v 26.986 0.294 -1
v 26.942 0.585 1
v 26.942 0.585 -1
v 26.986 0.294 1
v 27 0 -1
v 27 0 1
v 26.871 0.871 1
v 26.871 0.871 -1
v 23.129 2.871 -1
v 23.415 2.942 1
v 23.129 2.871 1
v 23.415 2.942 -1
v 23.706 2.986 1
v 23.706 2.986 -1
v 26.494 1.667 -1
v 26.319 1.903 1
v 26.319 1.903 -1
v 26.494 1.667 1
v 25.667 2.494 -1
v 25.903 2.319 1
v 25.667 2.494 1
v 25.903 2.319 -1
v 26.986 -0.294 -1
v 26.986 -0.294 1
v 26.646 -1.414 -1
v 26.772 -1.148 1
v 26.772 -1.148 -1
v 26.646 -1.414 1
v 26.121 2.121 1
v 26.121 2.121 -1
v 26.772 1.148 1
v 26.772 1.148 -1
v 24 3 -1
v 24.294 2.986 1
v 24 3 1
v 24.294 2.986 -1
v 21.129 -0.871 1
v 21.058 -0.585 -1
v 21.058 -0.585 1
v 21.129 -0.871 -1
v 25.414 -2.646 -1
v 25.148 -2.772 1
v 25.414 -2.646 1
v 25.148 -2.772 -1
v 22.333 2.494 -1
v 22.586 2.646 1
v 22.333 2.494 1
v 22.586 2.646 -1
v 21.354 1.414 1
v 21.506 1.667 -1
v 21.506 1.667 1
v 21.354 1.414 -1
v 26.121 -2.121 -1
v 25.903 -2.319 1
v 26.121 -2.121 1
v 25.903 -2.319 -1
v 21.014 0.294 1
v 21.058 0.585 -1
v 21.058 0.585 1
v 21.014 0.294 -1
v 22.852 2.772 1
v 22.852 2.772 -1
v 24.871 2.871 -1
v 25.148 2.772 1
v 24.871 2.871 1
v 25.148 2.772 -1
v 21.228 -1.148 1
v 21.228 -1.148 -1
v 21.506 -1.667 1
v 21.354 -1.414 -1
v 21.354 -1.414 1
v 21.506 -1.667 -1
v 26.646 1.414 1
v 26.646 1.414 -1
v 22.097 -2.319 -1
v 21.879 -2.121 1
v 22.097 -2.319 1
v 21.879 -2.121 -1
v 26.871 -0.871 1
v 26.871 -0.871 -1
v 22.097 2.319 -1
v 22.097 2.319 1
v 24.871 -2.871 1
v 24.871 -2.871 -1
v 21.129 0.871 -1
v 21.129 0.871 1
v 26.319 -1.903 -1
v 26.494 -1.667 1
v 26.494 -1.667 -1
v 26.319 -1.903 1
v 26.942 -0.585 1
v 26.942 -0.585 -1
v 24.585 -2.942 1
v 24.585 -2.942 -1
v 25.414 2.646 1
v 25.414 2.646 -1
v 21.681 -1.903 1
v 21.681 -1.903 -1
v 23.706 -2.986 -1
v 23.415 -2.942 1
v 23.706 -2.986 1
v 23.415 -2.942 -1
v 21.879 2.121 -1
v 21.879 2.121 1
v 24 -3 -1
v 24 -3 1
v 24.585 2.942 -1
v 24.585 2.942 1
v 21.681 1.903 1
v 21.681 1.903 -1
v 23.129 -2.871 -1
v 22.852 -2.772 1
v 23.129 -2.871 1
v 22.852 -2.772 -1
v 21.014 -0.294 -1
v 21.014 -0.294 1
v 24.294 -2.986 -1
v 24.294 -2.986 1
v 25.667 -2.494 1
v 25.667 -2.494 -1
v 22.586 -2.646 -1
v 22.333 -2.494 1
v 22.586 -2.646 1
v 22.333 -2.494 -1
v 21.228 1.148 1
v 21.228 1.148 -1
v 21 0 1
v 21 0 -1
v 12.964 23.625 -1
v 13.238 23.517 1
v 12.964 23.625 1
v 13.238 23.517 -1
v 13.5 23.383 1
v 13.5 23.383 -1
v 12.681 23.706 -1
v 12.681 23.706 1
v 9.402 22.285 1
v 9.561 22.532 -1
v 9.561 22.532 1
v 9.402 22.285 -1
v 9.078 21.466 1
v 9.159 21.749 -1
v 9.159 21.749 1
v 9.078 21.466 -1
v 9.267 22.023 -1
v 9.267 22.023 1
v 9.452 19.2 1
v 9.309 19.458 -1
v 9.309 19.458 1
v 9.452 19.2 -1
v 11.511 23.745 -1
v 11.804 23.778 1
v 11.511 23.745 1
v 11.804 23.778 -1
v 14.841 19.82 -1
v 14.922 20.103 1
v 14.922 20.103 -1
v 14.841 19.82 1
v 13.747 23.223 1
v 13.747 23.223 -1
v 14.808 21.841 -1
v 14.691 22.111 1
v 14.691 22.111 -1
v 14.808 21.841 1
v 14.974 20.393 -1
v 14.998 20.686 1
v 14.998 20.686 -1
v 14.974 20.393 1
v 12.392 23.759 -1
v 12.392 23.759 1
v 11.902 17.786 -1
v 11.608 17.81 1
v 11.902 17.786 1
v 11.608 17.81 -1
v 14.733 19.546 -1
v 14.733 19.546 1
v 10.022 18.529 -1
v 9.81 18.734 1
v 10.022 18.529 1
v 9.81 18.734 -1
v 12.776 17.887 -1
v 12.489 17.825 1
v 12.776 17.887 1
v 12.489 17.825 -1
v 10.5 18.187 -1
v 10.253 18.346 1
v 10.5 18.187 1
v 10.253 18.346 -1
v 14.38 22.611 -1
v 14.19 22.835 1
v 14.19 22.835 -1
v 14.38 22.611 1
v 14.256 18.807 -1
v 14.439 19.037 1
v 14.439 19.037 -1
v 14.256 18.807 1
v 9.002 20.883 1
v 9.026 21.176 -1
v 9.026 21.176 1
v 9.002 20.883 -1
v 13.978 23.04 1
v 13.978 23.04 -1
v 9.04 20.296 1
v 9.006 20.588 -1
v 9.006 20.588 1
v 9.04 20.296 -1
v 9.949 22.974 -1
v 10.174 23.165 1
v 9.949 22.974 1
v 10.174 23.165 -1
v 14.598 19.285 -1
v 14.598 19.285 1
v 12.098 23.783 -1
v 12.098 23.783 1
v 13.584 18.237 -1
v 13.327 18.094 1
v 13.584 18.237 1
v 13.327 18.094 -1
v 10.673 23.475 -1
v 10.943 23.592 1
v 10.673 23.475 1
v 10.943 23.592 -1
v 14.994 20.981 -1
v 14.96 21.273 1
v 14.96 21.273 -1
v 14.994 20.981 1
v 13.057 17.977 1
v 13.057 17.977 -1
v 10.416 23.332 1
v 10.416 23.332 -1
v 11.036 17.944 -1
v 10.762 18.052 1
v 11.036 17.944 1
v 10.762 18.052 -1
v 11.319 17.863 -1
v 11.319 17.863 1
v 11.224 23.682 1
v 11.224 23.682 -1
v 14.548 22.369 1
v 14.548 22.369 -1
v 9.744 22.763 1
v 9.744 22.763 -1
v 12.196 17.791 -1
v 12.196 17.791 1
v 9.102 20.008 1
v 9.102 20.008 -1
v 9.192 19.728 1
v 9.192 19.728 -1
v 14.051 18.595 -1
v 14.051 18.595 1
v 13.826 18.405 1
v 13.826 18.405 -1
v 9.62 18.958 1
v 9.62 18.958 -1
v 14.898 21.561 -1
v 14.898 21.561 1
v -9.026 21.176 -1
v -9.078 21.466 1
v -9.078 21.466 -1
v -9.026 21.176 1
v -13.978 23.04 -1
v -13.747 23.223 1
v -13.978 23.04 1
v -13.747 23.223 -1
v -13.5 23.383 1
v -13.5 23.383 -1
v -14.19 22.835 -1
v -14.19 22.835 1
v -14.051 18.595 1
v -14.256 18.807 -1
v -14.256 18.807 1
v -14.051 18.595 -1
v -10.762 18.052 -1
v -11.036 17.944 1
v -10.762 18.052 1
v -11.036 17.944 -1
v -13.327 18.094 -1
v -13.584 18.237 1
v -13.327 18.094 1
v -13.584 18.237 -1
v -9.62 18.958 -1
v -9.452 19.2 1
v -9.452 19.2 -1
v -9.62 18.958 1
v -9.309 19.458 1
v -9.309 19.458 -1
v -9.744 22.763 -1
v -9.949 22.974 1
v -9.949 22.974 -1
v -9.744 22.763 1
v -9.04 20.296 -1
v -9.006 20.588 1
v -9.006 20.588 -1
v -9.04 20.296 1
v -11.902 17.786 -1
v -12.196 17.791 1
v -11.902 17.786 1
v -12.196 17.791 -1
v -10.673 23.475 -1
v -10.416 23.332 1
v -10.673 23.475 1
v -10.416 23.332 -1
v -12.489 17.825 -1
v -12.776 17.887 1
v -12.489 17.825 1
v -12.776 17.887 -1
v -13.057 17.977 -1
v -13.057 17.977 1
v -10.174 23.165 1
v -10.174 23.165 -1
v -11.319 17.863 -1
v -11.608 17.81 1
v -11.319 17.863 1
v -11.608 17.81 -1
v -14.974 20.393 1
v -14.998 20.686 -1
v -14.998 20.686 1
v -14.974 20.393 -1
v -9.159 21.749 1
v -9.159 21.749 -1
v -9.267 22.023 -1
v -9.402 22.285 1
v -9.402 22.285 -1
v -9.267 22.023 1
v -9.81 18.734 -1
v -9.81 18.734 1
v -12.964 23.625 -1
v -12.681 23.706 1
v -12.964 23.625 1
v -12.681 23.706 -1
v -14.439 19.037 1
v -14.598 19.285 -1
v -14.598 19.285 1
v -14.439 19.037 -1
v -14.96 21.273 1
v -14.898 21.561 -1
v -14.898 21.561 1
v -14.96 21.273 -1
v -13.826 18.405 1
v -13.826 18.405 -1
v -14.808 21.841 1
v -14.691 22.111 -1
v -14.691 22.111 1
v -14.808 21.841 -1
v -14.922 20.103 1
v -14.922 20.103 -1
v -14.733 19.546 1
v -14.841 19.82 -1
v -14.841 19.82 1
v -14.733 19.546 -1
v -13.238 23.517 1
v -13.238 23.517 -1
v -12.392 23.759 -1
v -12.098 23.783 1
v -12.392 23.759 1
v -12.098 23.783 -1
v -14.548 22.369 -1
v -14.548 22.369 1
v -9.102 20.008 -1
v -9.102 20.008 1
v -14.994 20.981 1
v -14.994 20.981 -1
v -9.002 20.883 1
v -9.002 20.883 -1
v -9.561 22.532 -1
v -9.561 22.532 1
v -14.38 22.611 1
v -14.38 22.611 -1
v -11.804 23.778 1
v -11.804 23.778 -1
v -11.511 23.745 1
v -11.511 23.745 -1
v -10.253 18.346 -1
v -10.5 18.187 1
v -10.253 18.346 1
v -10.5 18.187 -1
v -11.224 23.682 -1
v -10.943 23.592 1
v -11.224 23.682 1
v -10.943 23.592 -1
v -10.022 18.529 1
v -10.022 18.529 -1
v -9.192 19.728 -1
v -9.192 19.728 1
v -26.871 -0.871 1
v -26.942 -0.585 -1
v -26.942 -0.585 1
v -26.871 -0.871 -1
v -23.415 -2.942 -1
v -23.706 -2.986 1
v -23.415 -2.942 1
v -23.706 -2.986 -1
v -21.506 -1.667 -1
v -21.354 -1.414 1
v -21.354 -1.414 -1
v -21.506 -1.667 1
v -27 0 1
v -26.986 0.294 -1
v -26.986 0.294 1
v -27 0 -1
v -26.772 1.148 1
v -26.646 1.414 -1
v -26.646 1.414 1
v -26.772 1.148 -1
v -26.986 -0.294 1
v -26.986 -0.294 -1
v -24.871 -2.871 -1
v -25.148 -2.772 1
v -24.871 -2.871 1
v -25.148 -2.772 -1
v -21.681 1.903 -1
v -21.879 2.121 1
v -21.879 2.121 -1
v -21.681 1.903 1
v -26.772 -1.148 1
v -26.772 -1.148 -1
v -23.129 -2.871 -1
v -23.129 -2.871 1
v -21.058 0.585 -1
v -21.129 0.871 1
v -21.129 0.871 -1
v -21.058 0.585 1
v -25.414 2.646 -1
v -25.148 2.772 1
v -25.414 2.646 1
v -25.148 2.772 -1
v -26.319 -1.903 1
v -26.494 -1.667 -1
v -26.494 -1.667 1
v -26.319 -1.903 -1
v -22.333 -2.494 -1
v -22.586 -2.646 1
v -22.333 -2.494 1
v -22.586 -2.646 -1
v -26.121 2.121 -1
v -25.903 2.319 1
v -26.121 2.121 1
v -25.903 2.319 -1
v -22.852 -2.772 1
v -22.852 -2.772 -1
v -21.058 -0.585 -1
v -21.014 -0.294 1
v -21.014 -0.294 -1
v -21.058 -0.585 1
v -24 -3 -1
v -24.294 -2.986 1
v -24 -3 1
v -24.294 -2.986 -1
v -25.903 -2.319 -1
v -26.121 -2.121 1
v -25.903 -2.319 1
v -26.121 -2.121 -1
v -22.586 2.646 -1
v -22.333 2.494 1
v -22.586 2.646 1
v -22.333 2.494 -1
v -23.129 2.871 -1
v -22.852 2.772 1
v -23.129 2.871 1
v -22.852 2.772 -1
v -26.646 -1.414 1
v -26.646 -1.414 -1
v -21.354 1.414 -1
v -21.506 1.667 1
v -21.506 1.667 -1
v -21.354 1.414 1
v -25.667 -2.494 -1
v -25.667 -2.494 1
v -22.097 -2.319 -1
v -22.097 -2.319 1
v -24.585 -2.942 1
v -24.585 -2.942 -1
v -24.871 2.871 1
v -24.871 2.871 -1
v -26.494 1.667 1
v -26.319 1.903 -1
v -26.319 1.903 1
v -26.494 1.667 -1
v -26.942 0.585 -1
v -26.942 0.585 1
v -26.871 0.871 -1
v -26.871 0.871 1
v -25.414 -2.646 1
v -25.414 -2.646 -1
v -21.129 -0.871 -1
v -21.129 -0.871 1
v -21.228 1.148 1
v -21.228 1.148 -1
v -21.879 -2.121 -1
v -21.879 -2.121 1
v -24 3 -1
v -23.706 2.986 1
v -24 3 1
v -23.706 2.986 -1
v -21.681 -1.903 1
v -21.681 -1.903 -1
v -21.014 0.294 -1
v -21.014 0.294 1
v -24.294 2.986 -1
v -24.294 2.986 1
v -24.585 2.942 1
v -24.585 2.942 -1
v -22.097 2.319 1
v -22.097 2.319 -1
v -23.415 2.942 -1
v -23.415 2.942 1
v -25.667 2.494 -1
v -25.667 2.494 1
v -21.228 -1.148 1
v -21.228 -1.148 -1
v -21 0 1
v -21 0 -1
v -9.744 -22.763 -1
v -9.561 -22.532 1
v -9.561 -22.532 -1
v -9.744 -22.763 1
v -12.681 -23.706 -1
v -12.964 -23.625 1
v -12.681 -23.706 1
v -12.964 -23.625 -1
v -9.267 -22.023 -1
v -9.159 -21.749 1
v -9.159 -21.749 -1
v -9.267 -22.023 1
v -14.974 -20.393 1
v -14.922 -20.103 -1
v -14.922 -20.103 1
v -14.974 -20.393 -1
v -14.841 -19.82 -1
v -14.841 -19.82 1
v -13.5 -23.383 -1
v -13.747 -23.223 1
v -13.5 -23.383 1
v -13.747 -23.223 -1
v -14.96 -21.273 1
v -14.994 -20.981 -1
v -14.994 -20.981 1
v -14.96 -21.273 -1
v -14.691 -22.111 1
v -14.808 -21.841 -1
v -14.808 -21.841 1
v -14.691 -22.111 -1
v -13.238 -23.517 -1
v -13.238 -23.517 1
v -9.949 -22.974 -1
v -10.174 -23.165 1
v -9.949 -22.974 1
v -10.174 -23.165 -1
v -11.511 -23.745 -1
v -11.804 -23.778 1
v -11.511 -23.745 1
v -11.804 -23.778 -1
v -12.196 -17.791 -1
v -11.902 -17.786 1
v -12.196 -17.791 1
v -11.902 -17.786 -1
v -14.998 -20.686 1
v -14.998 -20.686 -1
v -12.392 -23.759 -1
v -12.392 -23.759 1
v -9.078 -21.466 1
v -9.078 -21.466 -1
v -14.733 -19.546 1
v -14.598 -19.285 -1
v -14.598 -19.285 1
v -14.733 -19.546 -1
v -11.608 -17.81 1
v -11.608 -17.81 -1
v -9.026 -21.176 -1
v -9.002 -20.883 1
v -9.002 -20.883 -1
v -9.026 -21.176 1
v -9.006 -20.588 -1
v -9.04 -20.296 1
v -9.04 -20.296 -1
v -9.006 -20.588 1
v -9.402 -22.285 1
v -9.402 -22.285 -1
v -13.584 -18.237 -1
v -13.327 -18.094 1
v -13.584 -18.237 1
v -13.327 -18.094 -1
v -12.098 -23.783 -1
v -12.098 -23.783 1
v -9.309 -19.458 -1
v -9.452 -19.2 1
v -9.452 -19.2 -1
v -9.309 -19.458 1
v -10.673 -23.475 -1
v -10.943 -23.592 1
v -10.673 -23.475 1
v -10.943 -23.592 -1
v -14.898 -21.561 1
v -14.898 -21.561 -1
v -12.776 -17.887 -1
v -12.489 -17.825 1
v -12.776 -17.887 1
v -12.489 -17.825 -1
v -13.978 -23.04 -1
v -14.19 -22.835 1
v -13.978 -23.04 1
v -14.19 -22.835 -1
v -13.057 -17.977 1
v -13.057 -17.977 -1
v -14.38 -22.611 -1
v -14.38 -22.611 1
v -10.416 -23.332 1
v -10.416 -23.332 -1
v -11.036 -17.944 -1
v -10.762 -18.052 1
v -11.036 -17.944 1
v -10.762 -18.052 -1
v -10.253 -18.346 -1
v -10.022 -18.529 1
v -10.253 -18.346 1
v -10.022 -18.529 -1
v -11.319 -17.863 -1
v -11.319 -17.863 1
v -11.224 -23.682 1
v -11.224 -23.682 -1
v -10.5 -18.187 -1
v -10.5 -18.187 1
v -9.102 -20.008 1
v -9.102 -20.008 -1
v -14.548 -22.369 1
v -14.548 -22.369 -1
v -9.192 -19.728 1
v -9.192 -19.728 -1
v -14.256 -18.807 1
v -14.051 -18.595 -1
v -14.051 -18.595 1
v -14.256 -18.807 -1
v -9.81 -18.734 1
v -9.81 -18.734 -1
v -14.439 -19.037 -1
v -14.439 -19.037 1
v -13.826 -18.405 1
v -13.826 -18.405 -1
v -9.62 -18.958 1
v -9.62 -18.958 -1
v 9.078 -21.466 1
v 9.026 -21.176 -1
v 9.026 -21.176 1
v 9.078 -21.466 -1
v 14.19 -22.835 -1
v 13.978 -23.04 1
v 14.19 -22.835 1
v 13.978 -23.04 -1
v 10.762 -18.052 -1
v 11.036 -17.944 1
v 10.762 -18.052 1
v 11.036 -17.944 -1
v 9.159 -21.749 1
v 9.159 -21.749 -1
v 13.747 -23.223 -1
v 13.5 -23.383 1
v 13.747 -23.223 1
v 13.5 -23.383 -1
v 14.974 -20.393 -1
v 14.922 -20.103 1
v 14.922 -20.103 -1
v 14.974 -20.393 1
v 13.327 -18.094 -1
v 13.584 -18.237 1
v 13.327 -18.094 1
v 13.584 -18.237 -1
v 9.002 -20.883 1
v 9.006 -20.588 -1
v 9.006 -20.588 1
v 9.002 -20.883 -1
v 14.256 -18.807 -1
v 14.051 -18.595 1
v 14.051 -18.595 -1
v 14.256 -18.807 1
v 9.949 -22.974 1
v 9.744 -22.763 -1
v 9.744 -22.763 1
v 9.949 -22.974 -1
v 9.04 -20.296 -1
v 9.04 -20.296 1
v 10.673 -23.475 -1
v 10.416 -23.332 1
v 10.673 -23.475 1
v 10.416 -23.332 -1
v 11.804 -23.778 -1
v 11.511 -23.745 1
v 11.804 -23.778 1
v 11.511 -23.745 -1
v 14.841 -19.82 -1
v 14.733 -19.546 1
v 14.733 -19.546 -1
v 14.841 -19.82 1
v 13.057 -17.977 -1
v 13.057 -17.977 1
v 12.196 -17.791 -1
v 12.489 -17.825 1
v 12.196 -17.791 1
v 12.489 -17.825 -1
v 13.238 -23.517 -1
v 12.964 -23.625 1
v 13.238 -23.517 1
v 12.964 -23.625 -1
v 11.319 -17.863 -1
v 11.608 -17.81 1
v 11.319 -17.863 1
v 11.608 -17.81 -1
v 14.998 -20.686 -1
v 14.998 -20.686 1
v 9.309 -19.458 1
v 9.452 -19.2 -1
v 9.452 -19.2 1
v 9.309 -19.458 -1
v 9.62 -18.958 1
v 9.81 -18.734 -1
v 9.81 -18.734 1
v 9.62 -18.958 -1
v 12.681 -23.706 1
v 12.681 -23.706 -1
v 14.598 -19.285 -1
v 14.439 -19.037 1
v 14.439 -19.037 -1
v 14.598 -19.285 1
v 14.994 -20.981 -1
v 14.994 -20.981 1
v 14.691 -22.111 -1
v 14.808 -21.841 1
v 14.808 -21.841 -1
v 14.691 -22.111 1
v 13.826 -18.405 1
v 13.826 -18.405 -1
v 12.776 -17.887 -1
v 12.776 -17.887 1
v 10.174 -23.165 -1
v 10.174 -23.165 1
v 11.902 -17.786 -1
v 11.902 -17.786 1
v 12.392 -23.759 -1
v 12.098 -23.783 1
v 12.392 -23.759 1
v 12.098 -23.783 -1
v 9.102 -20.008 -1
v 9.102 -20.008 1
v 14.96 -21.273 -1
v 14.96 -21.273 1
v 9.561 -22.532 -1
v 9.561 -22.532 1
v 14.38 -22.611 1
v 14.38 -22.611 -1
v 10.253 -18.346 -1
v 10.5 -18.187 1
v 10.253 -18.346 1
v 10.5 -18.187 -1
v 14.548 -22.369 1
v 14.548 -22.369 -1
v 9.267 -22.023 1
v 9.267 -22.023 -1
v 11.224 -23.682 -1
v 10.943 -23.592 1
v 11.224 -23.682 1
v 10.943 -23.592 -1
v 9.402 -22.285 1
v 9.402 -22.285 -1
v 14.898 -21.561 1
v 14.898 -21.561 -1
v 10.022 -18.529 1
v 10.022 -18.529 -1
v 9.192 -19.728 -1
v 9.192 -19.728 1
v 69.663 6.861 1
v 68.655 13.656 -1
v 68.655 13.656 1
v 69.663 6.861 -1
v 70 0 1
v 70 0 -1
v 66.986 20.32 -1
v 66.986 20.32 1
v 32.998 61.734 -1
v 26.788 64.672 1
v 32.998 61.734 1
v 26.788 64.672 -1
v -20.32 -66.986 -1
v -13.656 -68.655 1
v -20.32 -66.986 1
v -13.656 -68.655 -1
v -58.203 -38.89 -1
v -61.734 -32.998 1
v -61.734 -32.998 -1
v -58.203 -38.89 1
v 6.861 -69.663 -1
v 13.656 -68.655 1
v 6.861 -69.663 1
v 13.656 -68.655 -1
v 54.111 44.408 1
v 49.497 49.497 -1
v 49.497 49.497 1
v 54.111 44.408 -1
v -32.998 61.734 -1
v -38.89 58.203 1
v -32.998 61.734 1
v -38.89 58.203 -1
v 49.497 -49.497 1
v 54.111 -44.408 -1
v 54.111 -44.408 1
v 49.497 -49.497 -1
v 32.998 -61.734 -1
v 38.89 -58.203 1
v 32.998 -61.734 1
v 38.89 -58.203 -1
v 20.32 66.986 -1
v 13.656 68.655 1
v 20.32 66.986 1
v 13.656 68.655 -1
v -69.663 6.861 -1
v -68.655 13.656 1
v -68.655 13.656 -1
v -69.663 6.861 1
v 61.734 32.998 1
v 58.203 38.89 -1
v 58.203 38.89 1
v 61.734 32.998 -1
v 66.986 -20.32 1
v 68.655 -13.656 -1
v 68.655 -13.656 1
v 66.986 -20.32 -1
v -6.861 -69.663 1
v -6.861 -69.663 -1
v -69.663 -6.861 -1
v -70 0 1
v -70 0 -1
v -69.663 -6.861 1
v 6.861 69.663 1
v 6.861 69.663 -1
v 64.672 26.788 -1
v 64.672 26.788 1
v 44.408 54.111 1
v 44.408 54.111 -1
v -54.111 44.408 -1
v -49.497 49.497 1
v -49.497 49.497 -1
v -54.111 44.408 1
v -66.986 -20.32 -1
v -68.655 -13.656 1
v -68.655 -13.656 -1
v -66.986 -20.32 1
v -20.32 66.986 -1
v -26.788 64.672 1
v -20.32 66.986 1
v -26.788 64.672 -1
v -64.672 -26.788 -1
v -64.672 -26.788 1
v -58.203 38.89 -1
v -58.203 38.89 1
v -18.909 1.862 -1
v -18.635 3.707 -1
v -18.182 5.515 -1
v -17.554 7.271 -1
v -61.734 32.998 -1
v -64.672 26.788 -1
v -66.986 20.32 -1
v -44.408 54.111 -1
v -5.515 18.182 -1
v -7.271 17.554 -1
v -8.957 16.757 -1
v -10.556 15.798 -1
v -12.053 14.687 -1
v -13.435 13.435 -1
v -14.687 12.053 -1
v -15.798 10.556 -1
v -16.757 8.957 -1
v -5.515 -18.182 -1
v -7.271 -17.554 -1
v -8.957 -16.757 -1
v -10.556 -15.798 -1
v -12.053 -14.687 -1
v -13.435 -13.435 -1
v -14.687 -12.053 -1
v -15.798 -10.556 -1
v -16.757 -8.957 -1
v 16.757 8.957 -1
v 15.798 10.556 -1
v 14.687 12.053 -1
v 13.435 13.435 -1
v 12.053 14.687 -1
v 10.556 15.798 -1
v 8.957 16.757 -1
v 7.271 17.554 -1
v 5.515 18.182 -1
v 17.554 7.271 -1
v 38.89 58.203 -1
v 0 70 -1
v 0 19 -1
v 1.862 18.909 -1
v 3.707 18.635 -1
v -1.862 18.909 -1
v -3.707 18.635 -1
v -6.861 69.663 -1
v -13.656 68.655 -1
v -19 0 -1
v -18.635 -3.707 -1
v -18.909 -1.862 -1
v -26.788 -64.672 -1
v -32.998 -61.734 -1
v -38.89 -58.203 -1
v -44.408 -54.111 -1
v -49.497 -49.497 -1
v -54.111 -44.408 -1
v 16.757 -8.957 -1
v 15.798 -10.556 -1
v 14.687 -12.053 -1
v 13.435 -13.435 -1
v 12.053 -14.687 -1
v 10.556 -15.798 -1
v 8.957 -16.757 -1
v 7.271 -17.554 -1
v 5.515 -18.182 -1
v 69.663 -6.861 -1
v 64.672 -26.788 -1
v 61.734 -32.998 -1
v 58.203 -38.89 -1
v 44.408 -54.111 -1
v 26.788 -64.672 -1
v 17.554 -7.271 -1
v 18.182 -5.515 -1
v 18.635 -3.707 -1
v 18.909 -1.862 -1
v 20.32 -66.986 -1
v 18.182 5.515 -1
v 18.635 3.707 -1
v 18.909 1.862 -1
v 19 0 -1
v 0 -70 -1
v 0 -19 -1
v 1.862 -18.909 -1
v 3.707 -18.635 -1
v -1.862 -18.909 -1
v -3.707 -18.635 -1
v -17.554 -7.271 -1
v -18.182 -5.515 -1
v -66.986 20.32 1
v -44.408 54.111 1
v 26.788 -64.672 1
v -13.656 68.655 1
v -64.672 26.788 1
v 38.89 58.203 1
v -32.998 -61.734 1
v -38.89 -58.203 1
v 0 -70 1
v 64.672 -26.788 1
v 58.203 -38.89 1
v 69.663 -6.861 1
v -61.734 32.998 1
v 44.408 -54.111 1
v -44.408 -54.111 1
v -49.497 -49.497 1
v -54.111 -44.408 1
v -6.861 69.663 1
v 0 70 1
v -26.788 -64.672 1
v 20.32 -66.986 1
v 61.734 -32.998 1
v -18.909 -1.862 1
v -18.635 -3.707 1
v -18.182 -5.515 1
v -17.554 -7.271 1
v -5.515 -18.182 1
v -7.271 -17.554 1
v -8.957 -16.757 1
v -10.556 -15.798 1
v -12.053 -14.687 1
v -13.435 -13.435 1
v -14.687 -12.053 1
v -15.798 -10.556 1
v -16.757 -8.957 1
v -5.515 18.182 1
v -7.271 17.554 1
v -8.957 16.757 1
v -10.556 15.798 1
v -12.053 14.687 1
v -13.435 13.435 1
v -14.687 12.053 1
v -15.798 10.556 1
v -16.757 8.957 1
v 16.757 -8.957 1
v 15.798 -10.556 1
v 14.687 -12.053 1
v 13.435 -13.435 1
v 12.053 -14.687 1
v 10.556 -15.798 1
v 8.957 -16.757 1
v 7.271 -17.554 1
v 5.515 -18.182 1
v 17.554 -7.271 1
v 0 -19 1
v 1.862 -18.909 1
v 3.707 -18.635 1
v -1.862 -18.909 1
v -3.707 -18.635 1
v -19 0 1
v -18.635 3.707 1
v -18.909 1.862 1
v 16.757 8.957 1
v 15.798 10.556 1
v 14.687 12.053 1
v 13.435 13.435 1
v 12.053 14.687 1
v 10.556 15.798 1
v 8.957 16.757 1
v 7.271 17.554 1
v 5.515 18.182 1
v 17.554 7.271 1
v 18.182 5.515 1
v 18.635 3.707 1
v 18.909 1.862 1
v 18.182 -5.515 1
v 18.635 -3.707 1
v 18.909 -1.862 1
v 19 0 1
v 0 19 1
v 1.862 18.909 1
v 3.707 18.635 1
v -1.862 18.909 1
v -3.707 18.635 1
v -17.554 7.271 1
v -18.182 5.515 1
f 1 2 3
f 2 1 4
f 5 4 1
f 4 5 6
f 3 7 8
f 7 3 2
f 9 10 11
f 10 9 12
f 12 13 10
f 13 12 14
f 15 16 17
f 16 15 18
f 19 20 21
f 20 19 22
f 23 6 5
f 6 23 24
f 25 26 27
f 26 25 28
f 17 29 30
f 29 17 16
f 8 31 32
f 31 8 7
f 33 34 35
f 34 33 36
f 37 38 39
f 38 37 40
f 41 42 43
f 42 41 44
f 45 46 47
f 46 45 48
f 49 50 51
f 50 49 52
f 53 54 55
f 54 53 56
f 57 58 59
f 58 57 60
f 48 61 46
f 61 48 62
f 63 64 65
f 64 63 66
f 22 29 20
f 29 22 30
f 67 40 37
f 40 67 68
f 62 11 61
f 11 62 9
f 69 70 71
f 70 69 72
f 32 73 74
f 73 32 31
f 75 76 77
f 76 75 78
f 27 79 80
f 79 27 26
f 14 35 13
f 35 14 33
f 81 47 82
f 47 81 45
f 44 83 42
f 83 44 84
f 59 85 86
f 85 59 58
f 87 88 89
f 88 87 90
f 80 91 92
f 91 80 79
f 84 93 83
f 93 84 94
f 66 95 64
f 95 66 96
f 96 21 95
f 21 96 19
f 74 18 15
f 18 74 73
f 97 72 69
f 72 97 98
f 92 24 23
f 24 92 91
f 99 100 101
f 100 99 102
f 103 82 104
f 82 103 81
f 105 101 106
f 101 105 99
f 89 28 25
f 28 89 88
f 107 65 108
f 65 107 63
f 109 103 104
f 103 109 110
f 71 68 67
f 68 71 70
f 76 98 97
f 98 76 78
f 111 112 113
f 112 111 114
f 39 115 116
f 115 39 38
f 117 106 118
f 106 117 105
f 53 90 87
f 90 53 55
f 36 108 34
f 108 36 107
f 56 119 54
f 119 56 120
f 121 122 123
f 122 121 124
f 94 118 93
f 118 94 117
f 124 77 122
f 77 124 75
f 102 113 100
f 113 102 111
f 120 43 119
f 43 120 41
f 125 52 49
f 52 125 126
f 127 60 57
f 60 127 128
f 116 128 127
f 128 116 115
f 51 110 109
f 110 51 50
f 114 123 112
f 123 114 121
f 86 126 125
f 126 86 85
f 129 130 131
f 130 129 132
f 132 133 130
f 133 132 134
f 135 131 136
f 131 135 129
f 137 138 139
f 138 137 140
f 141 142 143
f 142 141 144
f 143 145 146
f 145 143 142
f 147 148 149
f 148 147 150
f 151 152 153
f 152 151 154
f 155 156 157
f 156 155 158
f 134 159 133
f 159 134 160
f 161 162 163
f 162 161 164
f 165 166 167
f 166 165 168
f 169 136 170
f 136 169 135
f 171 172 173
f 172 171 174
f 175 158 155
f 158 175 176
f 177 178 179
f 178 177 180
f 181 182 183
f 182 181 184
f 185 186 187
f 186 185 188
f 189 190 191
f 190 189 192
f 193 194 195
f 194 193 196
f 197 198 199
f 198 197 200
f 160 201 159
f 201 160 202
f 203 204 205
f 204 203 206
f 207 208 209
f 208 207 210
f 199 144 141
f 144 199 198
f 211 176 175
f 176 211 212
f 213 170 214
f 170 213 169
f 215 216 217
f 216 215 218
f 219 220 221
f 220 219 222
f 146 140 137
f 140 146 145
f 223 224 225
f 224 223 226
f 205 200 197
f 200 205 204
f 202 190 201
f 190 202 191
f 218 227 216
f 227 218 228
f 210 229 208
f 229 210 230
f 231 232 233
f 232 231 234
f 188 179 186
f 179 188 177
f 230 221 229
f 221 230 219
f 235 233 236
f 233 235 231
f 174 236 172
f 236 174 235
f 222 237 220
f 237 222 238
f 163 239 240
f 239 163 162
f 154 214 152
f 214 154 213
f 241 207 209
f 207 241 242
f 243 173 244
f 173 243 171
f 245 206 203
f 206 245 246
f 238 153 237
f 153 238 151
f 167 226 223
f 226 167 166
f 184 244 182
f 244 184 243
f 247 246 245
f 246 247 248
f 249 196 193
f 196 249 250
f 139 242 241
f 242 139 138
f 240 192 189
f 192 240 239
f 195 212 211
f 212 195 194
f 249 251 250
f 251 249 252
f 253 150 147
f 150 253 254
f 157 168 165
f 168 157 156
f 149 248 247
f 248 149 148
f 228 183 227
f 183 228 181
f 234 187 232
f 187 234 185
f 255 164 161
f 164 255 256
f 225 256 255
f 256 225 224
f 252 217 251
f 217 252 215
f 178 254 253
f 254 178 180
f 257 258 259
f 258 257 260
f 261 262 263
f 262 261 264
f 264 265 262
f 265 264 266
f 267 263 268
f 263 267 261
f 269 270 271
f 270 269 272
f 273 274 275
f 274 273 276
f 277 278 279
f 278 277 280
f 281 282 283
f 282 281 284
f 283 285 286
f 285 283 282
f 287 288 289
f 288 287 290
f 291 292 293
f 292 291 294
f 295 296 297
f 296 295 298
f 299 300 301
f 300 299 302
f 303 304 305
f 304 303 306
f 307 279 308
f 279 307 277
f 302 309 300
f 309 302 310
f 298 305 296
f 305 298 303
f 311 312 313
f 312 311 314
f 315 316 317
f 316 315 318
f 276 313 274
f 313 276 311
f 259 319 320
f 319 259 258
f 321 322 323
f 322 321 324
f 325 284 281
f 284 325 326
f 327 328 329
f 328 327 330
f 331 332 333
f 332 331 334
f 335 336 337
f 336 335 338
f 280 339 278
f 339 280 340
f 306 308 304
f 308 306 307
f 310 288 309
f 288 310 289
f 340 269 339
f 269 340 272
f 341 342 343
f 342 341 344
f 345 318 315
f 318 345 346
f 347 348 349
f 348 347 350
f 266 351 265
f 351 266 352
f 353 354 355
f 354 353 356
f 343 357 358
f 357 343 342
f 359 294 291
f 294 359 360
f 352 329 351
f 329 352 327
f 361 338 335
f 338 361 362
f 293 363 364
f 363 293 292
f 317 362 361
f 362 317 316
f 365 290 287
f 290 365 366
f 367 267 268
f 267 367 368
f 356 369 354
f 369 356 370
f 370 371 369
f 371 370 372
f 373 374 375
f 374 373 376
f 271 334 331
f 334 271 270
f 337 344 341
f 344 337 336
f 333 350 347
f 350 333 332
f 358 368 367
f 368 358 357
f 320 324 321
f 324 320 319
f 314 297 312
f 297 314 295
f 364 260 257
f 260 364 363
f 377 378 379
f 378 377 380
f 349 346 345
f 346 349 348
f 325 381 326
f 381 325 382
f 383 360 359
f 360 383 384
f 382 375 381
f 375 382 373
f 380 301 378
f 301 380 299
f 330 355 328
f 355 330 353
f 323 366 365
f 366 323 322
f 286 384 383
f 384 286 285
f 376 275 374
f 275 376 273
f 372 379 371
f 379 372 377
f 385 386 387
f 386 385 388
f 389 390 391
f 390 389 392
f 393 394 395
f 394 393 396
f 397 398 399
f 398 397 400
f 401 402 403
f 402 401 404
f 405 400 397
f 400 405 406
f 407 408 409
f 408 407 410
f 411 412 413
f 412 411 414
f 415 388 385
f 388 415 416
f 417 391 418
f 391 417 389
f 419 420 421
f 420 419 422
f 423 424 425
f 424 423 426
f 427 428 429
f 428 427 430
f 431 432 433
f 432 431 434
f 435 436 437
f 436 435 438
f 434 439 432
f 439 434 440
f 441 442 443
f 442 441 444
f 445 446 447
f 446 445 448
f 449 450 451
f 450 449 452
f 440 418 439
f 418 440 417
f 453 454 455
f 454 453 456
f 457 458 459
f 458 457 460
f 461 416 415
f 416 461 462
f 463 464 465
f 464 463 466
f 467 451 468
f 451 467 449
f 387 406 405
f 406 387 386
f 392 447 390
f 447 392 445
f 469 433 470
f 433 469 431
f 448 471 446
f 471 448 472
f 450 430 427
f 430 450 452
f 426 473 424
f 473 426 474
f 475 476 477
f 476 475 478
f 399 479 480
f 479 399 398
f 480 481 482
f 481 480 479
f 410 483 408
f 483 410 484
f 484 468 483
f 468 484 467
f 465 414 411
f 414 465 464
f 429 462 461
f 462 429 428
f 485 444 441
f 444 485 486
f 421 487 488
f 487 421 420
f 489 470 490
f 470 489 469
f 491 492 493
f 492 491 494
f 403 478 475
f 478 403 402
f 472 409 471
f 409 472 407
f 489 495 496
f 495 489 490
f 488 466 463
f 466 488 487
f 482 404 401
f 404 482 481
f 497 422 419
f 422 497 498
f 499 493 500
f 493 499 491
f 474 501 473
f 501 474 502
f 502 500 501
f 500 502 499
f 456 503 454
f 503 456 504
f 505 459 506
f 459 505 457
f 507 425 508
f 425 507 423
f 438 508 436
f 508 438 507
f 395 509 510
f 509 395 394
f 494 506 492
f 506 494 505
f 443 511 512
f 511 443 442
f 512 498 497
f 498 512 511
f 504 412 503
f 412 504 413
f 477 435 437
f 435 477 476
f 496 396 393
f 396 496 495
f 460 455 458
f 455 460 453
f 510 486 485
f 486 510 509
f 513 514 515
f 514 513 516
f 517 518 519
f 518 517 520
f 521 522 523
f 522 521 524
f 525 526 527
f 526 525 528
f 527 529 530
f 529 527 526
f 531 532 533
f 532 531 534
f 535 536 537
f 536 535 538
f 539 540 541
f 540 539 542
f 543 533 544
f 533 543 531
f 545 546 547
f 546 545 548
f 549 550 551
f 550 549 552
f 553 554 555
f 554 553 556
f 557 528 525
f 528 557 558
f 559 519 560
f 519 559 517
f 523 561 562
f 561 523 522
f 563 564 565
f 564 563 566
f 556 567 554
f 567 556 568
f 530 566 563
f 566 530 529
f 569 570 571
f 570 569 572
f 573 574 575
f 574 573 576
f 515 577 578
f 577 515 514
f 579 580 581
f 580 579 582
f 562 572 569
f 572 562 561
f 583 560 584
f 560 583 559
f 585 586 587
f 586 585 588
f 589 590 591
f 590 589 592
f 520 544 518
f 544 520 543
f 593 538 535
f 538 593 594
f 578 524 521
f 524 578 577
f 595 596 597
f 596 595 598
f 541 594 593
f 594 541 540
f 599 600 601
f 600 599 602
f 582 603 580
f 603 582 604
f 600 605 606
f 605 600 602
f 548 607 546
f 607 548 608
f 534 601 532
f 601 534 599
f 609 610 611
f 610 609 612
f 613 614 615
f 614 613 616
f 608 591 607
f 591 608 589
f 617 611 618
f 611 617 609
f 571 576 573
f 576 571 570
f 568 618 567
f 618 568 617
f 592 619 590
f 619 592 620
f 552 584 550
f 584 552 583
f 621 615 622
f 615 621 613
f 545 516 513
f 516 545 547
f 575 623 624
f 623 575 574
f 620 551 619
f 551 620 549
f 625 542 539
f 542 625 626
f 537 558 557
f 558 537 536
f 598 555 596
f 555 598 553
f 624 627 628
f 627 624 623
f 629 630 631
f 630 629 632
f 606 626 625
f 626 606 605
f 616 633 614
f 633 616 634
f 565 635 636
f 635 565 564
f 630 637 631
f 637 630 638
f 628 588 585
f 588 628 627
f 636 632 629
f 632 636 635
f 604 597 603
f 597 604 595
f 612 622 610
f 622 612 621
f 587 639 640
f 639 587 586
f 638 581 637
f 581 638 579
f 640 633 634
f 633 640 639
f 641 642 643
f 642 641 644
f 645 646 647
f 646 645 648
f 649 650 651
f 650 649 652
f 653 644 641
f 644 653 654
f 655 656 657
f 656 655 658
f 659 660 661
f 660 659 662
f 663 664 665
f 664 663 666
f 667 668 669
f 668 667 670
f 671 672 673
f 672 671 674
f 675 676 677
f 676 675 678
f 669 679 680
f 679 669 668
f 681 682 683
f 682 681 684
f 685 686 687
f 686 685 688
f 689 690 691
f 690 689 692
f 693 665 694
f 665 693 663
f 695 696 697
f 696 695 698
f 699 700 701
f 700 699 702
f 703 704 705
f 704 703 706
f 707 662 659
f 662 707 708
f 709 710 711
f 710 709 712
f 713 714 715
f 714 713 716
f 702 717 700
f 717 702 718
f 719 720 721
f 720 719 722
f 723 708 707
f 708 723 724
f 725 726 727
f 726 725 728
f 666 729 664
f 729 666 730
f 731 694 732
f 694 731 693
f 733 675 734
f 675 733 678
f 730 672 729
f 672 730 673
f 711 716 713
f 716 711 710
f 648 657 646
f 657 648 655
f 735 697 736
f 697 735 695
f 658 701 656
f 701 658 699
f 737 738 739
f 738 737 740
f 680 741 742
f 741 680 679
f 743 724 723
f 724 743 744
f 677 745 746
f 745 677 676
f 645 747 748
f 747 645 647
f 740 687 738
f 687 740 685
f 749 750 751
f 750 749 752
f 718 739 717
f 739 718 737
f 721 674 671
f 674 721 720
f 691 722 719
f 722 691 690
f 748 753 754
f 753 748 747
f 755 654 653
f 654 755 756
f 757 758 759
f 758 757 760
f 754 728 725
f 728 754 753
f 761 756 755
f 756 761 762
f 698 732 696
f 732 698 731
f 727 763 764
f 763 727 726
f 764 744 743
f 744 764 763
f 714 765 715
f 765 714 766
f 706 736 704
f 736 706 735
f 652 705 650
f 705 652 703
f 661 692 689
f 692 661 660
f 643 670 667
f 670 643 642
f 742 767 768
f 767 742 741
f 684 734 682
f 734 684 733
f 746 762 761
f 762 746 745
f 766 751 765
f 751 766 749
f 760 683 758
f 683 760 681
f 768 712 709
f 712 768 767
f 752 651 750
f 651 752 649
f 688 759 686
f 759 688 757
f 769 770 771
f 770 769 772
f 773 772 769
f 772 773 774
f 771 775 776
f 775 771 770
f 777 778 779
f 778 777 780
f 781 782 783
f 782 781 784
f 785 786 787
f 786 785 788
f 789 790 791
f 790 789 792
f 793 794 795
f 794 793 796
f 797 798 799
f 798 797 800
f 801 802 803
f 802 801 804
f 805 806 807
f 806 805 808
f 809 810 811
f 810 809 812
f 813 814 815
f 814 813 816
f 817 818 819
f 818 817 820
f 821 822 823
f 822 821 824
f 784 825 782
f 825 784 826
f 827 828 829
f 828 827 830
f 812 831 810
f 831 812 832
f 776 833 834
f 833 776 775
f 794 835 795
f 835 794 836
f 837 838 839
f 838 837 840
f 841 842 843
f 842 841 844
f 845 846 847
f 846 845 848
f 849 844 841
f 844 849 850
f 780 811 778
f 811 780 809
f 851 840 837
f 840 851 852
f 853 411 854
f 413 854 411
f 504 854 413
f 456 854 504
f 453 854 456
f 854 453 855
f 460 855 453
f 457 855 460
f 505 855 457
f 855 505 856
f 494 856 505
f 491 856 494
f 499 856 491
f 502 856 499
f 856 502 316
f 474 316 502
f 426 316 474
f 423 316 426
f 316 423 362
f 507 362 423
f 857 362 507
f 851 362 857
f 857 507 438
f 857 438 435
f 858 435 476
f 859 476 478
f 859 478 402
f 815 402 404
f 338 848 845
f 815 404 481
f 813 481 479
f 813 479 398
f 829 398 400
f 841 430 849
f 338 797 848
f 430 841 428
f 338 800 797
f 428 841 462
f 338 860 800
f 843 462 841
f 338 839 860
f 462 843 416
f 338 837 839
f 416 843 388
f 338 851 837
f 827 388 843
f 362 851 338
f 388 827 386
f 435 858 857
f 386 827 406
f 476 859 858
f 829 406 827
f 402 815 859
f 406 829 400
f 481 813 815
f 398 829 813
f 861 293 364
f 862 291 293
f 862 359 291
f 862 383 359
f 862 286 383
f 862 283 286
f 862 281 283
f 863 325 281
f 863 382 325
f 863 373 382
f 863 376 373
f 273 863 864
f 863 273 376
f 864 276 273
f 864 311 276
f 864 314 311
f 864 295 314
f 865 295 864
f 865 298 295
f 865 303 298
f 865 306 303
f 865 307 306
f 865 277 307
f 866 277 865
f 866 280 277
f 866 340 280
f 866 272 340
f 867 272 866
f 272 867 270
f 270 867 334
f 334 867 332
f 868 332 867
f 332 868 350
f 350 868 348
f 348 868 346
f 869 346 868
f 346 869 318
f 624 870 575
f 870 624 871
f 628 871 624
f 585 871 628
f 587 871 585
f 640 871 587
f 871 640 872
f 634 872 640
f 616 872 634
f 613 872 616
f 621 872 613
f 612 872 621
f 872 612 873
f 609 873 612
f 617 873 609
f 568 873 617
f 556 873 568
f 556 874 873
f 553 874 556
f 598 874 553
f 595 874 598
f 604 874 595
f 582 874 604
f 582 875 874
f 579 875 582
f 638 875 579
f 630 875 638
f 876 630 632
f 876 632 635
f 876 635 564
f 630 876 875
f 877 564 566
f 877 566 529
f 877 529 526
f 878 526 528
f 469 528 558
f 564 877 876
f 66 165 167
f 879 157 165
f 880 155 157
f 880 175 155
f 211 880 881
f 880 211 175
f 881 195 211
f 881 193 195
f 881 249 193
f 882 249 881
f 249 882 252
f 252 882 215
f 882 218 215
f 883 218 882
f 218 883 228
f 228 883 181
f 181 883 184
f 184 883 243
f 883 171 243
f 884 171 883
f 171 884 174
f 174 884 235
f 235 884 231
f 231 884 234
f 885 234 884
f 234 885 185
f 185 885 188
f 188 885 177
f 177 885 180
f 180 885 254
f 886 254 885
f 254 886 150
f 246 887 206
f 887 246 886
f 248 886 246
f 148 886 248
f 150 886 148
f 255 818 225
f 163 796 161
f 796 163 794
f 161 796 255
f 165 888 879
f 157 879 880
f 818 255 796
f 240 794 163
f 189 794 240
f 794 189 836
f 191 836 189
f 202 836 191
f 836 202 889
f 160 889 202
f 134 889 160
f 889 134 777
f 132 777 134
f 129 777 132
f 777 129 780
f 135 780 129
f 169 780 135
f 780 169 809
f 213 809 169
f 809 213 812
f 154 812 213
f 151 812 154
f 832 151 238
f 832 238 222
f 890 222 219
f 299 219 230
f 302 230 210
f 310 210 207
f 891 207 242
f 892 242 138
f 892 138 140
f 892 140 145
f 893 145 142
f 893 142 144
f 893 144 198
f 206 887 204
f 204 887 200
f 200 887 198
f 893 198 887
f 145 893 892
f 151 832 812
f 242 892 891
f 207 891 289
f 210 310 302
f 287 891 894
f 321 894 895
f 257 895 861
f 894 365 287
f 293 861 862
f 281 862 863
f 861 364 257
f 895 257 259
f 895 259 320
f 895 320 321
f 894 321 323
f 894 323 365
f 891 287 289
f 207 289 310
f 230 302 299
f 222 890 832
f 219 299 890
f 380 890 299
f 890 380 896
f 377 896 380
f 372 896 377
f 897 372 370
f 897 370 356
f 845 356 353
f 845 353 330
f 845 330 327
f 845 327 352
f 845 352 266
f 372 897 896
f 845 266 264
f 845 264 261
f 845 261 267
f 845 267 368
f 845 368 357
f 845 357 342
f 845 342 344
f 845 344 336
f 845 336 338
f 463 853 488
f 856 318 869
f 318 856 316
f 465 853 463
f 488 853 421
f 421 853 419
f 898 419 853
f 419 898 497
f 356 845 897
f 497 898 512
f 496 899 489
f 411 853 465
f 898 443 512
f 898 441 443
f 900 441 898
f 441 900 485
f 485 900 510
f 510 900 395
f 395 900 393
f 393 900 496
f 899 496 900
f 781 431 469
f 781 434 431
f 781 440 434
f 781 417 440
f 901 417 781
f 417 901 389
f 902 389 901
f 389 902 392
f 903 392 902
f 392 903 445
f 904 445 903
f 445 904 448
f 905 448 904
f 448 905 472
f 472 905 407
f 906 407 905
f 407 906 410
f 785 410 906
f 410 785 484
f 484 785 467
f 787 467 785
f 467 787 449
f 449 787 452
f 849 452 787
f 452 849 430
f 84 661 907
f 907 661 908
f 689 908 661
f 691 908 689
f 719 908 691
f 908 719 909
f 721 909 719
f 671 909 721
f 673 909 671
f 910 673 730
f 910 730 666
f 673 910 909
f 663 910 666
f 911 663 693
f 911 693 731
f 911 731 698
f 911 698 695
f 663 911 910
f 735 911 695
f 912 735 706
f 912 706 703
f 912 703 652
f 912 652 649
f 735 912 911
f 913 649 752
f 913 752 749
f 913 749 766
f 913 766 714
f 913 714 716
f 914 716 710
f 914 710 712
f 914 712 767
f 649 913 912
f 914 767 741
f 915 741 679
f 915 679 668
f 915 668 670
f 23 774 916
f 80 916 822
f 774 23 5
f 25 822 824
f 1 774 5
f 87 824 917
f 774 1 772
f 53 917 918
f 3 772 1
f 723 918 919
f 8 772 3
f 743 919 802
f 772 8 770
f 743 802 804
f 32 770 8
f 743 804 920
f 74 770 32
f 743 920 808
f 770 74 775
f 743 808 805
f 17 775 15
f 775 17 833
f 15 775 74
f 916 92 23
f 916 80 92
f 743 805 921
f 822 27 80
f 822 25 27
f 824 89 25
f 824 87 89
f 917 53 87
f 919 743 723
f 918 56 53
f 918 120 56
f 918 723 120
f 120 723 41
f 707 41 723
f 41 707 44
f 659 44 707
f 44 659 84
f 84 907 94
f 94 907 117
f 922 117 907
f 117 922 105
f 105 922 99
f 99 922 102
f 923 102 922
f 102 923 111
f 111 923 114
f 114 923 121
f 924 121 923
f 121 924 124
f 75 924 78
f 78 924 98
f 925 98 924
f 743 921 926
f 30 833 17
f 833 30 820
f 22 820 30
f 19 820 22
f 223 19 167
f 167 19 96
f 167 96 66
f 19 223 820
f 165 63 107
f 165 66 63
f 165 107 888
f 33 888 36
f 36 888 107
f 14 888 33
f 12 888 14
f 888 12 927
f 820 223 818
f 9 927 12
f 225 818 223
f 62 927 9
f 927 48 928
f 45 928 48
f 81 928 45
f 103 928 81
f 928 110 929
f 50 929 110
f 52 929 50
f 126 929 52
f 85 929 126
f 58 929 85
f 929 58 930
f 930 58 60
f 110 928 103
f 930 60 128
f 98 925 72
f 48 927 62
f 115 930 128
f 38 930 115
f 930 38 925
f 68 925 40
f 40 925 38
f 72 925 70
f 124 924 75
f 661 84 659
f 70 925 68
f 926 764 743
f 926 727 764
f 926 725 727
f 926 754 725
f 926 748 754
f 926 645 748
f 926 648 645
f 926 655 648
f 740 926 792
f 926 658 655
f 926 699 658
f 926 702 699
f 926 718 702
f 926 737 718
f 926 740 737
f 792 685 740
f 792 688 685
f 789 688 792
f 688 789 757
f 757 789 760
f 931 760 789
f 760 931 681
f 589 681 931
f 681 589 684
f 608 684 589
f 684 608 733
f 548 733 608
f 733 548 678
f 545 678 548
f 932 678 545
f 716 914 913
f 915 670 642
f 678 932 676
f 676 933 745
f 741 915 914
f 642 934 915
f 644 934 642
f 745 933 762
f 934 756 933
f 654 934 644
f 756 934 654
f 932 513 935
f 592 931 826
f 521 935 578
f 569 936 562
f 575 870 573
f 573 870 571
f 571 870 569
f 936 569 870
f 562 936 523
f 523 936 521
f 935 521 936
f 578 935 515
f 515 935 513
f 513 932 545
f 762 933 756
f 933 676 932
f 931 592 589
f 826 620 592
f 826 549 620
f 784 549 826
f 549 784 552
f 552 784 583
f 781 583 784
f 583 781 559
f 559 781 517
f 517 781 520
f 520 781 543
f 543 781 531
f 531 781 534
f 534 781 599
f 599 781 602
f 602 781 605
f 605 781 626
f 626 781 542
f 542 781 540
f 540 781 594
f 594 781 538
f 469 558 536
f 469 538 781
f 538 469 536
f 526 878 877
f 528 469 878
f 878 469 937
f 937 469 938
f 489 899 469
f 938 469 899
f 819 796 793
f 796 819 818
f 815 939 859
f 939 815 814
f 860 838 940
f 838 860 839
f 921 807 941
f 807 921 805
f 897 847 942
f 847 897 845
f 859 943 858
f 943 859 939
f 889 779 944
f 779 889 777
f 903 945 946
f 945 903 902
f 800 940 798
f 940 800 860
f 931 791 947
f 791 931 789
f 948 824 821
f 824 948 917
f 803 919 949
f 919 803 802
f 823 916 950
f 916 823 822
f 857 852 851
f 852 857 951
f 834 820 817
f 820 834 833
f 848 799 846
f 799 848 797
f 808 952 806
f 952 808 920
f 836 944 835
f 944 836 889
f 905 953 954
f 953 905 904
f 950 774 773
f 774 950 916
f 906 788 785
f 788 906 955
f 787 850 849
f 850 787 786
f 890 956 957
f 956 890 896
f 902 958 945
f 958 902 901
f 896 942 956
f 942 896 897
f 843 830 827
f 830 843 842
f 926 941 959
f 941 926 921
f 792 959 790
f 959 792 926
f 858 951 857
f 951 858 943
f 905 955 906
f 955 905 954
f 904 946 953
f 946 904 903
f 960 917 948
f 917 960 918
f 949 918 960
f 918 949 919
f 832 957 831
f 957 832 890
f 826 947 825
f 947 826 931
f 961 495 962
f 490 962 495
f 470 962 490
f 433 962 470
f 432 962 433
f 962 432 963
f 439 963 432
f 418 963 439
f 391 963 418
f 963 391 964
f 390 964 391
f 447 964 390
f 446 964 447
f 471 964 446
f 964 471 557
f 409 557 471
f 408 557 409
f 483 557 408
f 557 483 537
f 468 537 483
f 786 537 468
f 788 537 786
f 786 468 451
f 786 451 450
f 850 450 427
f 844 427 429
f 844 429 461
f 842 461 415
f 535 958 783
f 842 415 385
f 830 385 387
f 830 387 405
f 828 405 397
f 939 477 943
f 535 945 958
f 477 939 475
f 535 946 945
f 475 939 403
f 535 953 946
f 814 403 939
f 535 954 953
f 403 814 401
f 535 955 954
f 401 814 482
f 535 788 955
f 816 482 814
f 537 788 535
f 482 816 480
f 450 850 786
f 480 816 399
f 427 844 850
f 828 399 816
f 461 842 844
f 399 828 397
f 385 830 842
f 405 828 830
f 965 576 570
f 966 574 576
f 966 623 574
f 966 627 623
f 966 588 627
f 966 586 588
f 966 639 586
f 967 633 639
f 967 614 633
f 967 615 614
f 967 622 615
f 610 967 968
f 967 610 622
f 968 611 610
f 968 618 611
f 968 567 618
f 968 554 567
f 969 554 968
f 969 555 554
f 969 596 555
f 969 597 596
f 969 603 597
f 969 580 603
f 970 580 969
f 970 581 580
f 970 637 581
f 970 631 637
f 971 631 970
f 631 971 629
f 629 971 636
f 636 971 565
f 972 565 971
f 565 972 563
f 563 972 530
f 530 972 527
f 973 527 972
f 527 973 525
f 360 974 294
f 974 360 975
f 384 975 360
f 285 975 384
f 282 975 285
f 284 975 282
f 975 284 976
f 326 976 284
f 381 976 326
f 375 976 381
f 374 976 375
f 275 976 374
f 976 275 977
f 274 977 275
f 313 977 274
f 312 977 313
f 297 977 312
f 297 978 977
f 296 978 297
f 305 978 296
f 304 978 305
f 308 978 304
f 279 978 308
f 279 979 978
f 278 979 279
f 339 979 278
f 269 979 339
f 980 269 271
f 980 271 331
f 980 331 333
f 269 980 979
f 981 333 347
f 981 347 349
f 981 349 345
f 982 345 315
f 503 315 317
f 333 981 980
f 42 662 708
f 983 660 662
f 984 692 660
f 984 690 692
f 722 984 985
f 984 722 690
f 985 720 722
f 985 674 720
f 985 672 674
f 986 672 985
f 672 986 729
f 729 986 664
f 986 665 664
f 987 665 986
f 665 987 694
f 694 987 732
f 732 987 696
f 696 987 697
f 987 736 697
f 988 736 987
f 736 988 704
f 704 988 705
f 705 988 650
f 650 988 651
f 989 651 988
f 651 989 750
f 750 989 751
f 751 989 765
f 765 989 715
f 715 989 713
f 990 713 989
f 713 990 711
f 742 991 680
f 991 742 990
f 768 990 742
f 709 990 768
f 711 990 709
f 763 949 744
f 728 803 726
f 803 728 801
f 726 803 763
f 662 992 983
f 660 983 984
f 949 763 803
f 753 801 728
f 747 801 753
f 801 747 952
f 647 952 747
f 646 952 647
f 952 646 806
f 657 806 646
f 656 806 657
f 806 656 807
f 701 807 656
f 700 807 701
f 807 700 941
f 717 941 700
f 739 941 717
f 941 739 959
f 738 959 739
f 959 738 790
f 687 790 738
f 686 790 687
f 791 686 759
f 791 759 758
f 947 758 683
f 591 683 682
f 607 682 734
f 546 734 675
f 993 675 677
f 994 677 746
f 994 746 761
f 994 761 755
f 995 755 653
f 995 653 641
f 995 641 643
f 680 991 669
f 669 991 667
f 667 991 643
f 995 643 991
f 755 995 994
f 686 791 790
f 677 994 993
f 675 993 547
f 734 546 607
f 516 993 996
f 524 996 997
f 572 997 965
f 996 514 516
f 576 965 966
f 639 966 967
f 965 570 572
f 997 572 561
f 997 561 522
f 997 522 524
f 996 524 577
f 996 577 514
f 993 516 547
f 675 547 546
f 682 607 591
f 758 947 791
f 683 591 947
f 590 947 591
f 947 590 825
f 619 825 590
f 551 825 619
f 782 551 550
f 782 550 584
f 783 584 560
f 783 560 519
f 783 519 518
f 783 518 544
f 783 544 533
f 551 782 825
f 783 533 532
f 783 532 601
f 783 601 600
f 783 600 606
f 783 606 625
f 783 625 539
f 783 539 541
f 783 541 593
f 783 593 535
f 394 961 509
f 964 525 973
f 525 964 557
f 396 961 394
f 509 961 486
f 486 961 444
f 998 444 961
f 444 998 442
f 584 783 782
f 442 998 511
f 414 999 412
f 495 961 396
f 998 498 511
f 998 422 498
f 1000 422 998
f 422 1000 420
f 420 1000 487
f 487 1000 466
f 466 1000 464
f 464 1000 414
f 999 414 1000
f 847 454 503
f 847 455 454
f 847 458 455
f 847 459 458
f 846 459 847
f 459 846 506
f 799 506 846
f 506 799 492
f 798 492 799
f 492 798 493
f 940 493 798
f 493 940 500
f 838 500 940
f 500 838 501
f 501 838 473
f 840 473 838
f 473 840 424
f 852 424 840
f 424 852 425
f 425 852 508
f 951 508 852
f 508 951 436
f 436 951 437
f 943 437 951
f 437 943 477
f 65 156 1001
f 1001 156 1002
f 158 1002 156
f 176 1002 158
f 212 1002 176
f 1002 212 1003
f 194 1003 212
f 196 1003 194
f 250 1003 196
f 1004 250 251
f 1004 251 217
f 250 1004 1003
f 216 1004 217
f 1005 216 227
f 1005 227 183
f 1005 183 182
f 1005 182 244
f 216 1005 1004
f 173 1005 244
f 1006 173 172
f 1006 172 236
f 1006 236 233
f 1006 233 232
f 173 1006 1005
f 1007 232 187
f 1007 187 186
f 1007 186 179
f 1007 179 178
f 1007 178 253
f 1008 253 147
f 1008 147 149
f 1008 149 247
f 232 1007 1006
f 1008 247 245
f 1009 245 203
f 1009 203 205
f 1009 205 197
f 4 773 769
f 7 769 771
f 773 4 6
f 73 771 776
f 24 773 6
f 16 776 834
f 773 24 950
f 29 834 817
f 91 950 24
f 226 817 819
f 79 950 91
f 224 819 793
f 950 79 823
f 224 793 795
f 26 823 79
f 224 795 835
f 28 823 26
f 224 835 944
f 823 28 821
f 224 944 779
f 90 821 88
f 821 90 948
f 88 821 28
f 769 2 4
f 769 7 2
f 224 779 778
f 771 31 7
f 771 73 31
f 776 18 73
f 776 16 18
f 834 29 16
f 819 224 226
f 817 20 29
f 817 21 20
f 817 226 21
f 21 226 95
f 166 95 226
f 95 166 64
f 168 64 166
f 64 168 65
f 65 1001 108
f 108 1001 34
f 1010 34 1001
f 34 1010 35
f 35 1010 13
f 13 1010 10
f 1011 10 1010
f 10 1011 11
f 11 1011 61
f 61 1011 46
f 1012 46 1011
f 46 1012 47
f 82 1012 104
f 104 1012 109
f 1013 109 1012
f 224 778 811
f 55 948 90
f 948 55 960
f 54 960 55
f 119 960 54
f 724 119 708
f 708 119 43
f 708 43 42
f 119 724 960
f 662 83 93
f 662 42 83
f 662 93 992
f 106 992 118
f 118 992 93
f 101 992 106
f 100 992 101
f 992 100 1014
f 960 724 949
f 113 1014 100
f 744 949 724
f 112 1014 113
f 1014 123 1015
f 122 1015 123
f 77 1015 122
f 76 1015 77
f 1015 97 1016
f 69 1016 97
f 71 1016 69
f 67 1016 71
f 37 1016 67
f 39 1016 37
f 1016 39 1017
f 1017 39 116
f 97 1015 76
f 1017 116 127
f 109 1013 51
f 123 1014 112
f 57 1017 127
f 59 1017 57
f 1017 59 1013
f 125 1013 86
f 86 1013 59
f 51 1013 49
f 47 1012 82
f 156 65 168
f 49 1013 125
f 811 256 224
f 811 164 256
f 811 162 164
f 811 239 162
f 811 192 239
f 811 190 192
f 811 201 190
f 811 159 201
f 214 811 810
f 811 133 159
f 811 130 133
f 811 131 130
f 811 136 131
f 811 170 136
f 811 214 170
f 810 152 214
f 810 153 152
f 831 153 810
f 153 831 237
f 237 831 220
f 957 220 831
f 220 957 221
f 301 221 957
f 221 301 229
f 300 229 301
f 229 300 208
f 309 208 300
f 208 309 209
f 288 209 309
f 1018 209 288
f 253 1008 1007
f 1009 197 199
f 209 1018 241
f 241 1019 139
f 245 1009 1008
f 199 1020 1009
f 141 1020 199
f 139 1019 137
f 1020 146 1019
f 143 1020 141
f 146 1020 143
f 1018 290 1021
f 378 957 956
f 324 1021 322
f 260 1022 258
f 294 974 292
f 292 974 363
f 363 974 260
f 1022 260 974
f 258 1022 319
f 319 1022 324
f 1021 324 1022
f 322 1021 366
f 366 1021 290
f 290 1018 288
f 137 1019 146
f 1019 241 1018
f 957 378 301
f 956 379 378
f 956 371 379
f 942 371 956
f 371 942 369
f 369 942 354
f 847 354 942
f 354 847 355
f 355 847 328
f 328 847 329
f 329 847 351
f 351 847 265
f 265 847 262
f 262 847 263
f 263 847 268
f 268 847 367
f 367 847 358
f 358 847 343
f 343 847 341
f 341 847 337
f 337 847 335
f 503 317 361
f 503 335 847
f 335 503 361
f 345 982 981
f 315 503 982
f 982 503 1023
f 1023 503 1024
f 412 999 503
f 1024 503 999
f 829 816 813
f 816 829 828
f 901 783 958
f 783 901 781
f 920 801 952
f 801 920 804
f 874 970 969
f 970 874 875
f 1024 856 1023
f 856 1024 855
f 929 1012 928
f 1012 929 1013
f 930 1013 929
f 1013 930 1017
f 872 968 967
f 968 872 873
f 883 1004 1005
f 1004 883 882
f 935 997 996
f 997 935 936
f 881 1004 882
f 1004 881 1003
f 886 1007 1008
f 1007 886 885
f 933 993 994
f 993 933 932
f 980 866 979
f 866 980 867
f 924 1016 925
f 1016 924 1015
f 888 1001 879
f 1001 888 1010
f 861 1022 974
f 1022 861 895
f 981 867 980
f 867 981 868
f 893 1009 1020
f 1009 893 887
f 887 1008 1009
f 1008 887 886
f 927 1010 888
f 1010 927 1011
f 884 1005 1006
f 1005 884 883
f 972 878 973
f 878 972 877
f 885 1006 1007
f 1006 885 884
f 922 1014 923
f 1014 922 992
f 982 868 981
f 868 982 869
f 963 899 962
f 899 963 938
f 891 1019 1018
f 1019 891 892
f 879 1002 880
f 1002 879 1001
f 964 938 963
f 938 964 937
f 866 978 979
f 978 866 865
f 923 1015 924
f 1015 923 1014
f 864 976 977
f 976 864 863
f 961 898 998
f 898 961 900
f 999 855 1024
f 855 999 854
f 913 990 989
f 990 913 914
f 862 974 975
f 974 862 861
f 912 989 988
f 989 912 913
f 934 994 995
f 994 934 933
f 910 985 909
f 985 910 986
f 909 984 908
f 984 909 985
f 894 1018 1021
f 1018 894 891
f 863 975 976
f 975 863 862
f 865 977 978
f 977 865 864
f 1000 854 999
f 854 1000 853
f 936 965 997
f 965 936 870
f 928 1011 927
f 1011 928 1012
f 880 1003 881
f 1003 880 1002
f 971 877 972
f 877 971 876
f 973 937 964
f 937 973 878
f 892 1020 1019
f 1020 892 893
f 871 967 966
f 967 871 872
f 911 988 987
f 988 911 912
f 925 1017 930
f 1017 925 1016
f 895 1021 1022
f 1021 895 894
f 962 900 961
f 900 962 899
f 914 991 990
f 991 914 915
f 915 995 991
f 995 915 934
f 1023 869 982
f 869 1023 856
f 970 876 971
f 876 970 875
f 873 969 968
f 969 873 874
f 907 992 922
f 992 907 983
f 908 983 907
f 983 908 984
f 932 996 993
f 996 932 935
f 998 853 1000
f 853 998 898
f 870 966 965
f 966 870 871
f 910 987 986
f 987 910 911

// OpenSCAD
module BrakeDisc()
{
  $fn = 64;

  thickness = 2;

  difference()
  {
    cylinder(d=140, h=thickness, center=true);

    cylinder(d=38, h=thickness+1, center=true);

    for (a = [0 : 360 / 6: 359])
    {
      rotate([0, 0, a])
      {
        translate([24, 0, 0])
        {
          cylinder(d=6, h=thickness+1, center=true);
        }
      }
    }
  }
}

BrakeDisc();
